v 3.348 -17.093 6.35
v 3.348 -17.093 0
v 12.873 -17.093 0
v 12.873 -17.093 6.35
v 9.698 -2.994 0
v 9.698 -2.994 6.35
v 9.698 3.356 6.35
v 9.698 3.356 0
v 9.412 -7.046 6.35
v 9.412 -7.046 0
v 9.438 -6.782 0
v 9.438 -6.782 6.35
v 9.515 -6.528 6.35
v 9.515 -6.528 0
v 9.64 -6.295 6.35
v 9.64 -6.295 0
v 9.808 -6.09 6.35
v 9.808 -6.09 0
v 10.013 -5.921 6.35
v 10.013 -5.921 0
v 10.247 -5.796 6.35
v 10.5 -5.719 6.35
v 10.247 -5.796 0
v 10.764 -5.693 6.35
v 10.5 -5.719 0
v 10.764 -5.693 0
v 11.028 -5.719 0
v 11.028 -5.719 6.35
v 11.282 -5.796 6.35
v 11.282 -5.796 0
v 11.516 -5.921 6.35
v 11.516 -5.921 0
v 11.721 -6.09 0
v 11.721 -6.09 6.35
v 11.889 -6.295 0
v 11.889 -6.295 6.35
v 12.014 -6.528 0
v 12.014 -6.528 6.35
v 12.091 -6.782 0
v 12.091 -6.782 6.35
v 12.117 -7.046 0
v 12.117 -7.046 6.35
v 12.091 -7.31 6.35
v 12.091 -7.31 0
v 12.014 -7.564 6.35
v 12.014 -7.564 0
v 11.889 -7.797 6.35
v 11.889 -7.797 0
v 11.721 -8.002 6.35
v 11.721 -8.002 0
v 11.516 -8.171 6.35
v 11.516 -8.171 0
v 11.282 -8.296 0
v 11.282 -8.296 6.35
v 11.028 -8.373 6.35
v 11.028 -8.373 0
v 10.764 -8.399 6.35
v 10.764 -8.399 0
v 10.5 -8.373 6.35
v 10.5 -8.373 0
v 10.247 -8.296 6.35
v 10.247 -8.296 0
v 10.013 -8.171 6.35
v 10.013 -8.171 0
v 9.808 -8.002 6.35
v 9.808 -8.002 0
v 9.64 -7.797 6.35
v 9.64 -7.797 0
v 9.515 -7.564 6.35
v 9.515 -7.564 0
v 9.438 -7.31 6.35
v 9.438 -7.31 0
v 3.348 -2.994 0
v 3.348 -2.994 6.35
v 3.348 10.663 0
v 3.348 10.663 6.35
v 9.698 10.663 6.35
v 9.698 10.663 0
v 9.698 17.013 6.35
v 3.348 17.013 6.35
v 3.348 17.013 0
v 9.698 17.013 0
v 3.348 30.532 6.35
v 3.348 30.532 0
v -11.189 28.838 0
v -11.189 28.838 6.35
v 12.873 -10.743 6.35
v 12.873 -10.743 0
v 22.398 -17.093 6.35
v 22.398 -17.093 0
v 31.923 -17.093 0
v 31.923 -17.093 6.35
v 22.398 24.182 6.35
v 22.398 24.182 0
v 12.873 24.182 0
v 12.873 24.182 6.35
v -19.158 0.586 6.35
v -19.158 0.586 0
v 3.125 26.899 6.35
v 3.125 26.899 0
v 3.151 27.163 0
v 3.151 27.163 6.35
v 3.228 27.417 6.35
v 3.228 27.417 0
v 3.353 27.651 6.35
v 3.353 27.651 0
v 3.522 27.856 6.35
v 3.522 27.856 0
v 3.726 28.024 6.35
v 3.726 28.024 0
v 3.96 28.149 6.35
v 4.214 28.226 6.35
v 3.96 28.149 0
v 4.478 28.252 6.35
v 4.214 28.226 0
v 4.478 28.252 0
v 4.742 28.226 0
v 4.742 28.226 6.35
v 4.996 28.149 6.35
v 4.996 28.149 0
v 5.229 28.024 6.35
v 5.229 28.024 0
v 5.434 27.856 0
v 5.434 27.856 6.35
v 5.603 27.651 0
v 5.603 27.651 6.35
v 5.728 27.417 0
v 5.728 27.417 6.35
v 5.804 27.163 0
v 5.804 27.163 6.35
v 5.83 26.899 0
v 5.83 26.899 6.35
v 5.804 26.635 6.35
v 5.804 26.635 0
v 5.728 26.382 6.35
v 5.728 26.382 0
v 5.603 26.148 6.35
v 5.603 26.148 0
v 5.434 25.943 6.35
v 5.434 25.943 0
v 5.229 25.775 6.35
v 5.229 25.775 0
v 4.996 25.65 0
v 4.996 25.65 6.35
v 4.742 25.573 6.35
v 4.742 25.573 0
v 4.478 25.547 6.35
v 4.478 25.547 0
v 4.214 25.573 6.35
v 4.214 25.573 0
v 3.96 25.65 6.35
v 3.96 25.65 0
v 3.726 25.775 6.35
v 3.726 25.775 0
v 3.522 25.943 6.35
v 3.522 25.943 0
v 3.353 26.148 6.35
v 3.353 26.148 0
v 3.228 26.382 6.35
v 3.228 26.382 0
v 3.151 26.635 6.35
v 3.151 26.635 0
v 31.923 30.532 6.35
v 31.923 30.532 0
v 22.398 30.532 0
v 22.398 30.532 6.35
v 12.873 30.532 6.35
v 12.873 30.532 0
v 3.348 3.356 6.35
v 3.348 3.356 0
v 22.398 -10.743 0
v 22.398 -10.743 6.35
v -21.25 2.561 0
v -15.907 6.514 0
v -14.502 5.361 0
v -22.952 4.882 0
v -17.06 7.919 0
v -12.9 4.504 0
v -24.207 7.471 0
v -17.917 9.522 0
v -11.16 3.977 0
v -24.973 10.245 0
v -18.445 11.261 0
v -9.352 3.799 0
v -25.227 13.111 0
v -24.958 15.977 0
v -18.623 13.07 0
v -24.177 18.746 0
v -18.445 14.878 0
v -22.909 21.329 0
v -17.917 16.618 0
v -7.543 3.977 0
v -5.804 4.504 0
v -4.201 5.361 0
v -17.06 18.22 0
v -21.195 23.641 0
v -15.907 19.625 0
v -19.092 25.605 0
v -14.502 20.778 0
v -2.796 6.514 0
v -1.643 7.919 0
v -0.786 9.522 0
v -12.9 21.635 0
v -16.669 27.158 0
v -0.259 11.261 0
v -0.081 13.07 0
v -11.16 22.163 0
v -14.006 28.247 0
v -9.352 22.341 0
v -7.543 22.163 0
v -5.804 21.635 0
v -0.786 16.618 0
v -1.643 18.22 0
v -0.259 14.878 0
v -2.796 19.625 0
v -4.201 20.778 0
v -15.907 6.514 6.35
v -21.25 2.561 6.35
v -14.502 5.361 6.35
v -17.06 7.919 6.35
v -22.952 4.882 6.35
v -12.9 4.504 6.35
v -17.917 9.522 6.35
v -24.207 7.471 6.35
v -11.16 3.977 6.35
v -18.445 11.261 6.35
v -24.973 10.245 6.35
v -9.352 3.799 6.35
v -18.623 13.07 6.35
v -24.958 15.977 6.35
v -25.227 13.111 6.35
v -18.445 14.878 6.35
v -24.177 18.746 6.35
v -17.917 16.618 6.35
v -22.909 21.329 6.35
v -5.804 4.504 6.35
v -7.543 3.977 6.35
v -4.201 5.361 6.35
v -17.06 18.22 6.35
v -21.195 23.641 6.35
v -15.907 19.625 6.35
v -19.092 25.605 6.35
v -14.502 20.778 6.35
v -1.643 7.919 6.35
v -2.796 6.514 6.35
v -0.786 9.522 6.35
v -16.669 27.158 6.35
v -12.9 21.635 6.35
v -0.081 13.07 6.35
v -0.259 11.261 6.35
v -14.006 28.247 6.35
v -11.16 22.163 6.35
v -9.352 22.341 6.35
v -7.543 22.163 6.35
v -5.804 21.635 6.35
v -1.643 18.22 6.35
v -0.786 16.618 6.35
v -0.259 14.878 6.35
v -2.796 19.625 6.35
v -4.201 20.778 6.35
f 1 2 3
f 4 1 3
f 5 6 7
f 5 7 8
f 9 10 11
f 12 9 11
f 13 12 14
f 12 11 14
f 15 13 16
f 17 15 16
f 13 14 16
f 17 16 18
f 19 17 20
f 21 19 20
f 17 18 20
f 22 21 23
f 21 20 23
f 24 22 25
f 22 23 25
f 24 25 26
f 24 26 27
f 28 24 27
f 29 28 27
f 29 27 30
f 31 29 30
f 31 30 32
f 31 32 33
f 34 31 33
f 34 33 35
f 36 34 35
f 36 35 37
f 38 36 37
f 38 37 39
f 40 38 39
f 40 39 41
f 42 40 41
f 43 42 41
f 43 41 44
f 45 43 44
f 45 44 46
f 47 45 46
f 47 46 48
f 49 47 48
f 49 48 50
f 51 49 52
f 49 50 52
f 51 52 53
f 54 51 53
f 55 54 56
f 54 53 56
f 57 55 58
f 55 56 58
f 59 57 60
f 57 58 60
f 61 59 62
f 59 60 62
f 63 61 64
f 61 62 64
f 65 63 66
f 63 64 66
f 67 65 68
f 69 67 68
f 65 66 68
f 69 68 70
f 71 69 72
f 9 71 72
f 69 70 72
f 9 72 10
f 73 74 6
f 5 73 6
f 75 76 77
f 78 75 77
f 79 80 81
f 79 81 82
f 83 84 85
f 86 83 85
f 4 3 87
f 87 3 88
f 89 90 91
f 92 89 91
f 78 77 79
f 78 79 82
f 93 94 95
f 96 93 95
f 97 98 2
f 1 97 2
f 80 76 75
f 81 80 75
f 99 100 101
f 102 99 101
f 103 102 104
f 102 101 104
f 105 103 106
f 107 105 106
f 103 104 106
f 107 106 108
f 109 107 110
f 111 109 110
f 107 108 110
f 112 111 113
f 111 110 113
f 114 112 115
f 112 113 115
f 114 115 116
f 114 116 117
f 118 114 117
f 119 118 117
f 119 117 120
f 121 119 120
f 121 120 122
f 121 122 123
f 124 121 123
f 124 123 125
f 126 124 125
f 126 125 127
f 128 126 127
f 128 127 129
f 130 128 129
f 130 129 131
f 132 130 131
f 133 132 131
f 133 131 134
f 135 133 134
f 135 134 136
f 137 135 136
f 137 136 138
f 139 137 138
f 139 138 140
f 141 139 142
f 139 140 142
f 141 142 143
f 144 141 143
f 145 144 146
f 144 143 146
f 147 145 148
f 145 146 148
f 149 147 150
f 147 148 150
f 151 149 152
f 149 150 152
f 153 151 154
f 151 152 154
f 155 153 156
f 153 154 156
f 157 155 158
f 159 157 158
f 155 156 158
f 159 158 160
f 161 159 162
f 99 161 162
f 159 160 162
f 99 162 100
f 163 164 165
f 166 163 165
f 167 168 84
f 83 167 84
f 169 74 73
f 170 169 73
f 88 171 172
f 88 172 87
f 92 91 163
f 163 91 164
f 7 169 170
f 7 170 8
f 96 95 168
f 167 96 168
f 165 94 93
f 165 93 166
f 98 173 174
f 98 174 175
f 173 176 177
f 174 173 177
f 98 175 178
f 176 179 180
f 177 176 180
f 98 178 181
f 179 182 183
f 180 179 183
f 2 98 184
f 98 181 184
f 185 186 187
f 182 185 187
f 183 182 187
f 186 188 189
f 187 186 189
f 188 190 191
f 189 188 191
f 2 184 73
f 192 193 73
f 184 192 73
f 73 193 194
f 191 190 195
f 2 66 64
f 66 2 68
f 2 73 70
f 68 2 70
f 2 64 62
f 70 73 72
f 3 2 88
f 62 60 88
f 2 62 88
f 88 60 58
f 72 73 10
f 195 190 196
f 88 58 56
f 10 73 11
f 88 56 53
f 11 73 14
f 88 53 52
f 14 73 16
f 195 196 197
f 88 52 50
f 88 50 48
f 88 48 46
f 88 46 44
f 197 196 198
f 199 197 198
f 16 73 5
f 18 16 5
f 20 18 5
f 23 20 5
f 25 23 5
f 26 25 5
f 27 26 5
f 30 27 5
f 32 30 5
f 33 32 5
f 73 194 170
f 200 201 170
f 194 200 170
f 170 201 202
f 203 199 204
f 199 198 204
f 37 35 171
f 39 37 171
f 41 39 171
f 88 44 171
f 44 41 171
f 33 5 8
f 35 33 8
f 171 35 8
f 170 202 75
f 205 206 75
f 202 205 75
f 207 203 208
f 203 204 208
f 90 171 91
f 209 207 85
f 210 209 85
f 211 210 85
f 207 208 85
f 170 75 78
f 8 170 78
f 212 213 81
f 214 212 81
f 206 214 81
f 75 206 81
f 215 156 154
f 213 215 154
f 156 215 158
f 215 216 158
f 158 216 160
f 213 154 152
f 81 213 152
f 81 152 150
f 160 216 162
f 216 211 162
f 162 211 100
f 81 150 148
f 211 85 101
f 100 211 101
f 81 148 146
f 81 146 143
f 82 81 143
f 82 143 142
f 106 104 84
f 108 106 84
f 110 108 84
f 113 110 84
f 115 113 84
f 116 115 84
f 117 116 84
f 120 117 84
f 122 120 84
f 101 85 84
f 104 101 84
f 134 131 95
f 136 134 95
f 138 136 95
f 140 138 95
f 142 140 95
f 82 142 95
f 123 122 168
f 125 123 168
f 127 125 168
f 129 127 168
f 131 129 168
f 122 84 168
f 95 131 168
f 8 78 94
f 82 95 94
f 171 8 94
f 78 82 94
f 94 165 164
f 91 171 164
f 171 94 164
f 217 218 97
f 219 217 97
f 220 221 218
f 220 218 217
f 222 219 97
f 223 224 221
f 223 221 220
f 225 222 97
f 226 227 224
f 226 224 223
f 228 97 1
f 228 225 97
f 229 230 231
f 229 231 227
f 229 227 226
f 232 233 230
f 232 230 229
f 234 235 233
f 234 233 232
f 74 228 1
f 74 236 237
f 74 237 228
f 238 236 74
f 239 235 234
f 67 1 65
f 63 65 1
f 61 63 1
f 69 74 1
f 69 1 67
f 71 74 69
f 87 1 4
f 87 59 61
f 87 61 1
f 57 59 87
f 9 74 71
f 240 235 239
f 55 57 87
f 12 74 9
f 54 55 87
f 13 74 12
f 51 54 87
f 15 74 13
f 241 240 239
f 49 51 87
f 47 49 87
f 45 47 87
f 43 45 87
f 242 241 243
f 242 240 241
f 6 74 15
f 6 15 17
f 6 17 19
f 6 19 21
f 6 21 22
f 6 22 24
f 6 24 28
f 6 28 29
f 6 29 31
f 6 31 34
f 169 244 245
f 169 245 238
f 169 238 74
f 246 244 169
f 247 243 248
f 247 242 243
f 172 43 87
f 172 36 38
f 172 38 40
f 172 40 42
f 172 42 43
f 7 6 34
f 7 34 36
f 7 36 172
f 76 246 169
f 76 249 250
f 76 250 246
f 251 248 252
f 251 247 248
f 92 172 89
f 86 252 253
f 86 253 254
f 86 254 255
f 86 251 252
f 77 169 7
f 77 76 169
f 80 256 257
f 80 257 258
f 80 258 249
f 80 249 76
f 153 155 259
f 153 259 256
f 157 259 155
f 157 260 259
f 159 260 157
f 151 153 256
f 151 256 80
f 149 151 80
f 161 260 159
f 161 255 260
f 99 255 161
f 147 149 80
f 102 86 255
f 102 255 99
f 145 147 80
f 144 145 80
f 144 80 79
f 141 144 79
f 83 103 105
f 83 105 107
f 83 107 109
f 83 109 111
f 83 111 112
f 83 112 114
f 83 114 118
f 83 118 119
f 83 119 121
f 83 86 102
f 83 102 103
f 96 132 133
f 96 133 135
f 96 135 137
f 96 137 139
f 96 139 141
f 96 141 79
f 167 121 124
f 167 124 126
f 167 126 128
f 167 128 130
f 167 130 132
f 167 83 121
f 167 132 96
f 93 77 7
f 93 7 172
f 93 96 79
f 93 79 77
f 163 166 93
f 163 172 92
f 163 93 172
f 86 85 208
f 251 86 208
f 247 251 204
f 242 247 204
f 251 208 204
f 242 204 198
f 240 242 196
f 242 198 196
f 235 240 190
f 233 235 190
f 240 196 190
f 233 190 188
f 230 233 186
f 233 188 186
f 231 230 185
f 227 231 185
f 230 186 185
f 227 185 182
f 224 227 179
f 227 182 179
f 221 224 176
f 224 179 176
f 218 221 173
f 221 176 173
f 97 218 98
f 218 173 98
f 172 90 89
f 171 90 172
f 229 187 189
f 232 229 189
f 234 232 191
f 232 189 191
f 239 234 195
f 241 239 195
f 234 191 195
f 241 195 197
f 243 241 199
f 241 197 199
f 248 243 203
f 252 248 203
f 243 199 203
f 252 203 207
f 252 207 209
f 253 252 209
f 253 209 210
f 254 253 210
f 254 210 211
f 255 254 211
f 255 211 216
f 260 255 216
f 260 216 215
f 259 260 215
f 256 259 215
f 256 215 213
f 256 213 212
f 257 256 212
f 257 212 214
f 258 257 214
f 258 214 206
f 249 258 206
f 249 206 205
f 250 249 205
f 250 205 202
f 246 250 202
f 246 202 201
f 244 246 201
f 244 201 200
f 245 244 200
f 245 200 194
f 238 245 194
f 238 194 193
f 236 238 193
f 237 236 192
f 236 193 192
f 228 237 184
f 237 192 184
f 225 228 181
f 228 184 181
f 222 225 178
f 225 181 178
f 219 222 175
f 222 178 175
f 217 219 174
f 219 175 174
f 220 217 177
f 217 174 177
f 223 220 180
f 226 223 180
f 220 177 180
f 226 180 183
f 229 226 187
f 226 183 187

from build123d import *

# Parameters (mm, degrees)
MASS_DEPTH                = 6.35
SKETCH4_R                 = 9.271
CUT_EXTRUDE1_DEPTH        = 45.627810093
SKETCH3_W                 = 9.525
SKETCH3_H                 = 12.7
CUT_EXTRUDE2_DEPTH        = 45.627810093
F_6_32_TAPPED_HOLE1_D     = 2.7051
F_6_32_TAPPED_HOLE1_DEPTH = 152.4
F_6_32_TAPPED_HOLE1_TIP   = 0.81269403
CAVITY1_START             = -2.994165629
CAVITY1_OUTLINE_W         = 6.35
CAVITY1_OUTLINE_H         = 6.35
CAVITY1_DEPTH             = 6.35
CAVITY1_START_2           = 10.66280621
CAVITY1_2_OUTLINE_W       = 6.35
CAVITY1_2_OUTLINE_H       = 6.35
CAVITY1_2_DEPTH           = 6.35


# Read off the part's stored shape, not the designer's step: Cavity1
with BuildPart() as part:
    # Sketch1 → Mass (new body)
    with BuildSketch(Plane.XY):
        with BuildLine():
            Line((3.348333413, -17.092726624), (31.923333413, -17.092726624))
            Line((31.923333413, -17.092726624), (31.923333413, 30.532273376))
            Line((31.923333413, 30.532273376), (3.348333413, 30.532273376))
            Line((3.348333413, 30.532273376), (-11.189304159, 28.838055246))
            ThreePointArc((-11.189304159, 28.838055246), (-24.630570771, 17.379148263), (-19.157836039, 0.585596764))
            Line((-19.157836039, 0.585596764), (3.348333413, -17.092726624))
        make_face()
    extrude(amount=MASS_DEPTH)

    # Sketch4 → Cut-Extrude1 (cut, through all)
    with BuildSketch(Plane(origin=(0, 0, 0), x_dir=(-1, 0, 0), z_dir=(0, 0, -1))):
        with Locations((9.351666587, 13.069773376)):
            Circle(SKETCH4_R)
    extrude(amount=-CUT_EXTRUDE1_DEPTH, mode=Mode.SUBTRACT)

    # Sketch3 → Cut-Extrude2 (cut, through all)
    with BuildSketch(Plane(origin=(0, 0, 0), x_dir=(-1, 0, 0), z_dir=(0, 0, -1))):
        with Locations((-17.635833413, 30.532273376)):
            Rectangle(SKETCH3_W, SKETCH3_H)
        with Locations((-17.635833413, -17.092726624)):
            Rectangle(SKETCH3_W, SKETCH3_H)
    extrude(amount=-CUT_EXTRUDE2_DEPTH, mode=Mode.SUBTRACT)

    # #6-32 Tapped Hole1
    with Locations(Plane.XY.offset(6.35)):
        with Locations((10.764107125, -7.046000335), (4.47792784, 26.899367802), (-9.351666587, 13.069773376)):
            Hole(F_6_32_TAPPED_HOLE1_D / 2, depth=F_6_32_TAPPED_HOLE1_DEPTH)
            with Locations((0, 0, -(F_6_32_TAPPED_HOLE1_DEPTH + F_6_32_TAPPED_HOLE1_TIP / 2))):  # 118° drill point
                Cone(0, F_6_32_TAPPED_HOLE1_D / 2, F_6_32_TAPPED_HOLE1_TIP, mode=Mode.SUBTRACT)

    # Cavity1 outline → Cavity1 (cut)
    with BuildSketch(Plane(origin=(0, 0, 0), x_dir=(1, 0, 0), z_dir=(0, 1, 0)).offset(CAVITY1_START)):
        with Locations((6.523333416, -3.175)):
            Rectangle(CAVITY1_OUTLINE_W, CAVITY1_OUTLINE_H)
    extrude(amount=CAVITY1_DEPTH, mode=Mode.SUBTRACT)

    # Cavity1 2 outline → Cavity1 2 (cut)
    with BuildSketch(Plane(origin=(0, 0, 0), x_dir=(1, 0, 0), z_dir=(0, 1, 0)).offset(CAVITY1_START_2)):
        with Locations((6.523333416, -3.175)):
            Rectangle(CAVITY1_2_OUTLINE_W, CAVITY1_2_OUTLINE_H)
    extrude(amount=CAVITY1_2_DEPTH, mode=Mode.SUBTRACT)


solid = part.part
